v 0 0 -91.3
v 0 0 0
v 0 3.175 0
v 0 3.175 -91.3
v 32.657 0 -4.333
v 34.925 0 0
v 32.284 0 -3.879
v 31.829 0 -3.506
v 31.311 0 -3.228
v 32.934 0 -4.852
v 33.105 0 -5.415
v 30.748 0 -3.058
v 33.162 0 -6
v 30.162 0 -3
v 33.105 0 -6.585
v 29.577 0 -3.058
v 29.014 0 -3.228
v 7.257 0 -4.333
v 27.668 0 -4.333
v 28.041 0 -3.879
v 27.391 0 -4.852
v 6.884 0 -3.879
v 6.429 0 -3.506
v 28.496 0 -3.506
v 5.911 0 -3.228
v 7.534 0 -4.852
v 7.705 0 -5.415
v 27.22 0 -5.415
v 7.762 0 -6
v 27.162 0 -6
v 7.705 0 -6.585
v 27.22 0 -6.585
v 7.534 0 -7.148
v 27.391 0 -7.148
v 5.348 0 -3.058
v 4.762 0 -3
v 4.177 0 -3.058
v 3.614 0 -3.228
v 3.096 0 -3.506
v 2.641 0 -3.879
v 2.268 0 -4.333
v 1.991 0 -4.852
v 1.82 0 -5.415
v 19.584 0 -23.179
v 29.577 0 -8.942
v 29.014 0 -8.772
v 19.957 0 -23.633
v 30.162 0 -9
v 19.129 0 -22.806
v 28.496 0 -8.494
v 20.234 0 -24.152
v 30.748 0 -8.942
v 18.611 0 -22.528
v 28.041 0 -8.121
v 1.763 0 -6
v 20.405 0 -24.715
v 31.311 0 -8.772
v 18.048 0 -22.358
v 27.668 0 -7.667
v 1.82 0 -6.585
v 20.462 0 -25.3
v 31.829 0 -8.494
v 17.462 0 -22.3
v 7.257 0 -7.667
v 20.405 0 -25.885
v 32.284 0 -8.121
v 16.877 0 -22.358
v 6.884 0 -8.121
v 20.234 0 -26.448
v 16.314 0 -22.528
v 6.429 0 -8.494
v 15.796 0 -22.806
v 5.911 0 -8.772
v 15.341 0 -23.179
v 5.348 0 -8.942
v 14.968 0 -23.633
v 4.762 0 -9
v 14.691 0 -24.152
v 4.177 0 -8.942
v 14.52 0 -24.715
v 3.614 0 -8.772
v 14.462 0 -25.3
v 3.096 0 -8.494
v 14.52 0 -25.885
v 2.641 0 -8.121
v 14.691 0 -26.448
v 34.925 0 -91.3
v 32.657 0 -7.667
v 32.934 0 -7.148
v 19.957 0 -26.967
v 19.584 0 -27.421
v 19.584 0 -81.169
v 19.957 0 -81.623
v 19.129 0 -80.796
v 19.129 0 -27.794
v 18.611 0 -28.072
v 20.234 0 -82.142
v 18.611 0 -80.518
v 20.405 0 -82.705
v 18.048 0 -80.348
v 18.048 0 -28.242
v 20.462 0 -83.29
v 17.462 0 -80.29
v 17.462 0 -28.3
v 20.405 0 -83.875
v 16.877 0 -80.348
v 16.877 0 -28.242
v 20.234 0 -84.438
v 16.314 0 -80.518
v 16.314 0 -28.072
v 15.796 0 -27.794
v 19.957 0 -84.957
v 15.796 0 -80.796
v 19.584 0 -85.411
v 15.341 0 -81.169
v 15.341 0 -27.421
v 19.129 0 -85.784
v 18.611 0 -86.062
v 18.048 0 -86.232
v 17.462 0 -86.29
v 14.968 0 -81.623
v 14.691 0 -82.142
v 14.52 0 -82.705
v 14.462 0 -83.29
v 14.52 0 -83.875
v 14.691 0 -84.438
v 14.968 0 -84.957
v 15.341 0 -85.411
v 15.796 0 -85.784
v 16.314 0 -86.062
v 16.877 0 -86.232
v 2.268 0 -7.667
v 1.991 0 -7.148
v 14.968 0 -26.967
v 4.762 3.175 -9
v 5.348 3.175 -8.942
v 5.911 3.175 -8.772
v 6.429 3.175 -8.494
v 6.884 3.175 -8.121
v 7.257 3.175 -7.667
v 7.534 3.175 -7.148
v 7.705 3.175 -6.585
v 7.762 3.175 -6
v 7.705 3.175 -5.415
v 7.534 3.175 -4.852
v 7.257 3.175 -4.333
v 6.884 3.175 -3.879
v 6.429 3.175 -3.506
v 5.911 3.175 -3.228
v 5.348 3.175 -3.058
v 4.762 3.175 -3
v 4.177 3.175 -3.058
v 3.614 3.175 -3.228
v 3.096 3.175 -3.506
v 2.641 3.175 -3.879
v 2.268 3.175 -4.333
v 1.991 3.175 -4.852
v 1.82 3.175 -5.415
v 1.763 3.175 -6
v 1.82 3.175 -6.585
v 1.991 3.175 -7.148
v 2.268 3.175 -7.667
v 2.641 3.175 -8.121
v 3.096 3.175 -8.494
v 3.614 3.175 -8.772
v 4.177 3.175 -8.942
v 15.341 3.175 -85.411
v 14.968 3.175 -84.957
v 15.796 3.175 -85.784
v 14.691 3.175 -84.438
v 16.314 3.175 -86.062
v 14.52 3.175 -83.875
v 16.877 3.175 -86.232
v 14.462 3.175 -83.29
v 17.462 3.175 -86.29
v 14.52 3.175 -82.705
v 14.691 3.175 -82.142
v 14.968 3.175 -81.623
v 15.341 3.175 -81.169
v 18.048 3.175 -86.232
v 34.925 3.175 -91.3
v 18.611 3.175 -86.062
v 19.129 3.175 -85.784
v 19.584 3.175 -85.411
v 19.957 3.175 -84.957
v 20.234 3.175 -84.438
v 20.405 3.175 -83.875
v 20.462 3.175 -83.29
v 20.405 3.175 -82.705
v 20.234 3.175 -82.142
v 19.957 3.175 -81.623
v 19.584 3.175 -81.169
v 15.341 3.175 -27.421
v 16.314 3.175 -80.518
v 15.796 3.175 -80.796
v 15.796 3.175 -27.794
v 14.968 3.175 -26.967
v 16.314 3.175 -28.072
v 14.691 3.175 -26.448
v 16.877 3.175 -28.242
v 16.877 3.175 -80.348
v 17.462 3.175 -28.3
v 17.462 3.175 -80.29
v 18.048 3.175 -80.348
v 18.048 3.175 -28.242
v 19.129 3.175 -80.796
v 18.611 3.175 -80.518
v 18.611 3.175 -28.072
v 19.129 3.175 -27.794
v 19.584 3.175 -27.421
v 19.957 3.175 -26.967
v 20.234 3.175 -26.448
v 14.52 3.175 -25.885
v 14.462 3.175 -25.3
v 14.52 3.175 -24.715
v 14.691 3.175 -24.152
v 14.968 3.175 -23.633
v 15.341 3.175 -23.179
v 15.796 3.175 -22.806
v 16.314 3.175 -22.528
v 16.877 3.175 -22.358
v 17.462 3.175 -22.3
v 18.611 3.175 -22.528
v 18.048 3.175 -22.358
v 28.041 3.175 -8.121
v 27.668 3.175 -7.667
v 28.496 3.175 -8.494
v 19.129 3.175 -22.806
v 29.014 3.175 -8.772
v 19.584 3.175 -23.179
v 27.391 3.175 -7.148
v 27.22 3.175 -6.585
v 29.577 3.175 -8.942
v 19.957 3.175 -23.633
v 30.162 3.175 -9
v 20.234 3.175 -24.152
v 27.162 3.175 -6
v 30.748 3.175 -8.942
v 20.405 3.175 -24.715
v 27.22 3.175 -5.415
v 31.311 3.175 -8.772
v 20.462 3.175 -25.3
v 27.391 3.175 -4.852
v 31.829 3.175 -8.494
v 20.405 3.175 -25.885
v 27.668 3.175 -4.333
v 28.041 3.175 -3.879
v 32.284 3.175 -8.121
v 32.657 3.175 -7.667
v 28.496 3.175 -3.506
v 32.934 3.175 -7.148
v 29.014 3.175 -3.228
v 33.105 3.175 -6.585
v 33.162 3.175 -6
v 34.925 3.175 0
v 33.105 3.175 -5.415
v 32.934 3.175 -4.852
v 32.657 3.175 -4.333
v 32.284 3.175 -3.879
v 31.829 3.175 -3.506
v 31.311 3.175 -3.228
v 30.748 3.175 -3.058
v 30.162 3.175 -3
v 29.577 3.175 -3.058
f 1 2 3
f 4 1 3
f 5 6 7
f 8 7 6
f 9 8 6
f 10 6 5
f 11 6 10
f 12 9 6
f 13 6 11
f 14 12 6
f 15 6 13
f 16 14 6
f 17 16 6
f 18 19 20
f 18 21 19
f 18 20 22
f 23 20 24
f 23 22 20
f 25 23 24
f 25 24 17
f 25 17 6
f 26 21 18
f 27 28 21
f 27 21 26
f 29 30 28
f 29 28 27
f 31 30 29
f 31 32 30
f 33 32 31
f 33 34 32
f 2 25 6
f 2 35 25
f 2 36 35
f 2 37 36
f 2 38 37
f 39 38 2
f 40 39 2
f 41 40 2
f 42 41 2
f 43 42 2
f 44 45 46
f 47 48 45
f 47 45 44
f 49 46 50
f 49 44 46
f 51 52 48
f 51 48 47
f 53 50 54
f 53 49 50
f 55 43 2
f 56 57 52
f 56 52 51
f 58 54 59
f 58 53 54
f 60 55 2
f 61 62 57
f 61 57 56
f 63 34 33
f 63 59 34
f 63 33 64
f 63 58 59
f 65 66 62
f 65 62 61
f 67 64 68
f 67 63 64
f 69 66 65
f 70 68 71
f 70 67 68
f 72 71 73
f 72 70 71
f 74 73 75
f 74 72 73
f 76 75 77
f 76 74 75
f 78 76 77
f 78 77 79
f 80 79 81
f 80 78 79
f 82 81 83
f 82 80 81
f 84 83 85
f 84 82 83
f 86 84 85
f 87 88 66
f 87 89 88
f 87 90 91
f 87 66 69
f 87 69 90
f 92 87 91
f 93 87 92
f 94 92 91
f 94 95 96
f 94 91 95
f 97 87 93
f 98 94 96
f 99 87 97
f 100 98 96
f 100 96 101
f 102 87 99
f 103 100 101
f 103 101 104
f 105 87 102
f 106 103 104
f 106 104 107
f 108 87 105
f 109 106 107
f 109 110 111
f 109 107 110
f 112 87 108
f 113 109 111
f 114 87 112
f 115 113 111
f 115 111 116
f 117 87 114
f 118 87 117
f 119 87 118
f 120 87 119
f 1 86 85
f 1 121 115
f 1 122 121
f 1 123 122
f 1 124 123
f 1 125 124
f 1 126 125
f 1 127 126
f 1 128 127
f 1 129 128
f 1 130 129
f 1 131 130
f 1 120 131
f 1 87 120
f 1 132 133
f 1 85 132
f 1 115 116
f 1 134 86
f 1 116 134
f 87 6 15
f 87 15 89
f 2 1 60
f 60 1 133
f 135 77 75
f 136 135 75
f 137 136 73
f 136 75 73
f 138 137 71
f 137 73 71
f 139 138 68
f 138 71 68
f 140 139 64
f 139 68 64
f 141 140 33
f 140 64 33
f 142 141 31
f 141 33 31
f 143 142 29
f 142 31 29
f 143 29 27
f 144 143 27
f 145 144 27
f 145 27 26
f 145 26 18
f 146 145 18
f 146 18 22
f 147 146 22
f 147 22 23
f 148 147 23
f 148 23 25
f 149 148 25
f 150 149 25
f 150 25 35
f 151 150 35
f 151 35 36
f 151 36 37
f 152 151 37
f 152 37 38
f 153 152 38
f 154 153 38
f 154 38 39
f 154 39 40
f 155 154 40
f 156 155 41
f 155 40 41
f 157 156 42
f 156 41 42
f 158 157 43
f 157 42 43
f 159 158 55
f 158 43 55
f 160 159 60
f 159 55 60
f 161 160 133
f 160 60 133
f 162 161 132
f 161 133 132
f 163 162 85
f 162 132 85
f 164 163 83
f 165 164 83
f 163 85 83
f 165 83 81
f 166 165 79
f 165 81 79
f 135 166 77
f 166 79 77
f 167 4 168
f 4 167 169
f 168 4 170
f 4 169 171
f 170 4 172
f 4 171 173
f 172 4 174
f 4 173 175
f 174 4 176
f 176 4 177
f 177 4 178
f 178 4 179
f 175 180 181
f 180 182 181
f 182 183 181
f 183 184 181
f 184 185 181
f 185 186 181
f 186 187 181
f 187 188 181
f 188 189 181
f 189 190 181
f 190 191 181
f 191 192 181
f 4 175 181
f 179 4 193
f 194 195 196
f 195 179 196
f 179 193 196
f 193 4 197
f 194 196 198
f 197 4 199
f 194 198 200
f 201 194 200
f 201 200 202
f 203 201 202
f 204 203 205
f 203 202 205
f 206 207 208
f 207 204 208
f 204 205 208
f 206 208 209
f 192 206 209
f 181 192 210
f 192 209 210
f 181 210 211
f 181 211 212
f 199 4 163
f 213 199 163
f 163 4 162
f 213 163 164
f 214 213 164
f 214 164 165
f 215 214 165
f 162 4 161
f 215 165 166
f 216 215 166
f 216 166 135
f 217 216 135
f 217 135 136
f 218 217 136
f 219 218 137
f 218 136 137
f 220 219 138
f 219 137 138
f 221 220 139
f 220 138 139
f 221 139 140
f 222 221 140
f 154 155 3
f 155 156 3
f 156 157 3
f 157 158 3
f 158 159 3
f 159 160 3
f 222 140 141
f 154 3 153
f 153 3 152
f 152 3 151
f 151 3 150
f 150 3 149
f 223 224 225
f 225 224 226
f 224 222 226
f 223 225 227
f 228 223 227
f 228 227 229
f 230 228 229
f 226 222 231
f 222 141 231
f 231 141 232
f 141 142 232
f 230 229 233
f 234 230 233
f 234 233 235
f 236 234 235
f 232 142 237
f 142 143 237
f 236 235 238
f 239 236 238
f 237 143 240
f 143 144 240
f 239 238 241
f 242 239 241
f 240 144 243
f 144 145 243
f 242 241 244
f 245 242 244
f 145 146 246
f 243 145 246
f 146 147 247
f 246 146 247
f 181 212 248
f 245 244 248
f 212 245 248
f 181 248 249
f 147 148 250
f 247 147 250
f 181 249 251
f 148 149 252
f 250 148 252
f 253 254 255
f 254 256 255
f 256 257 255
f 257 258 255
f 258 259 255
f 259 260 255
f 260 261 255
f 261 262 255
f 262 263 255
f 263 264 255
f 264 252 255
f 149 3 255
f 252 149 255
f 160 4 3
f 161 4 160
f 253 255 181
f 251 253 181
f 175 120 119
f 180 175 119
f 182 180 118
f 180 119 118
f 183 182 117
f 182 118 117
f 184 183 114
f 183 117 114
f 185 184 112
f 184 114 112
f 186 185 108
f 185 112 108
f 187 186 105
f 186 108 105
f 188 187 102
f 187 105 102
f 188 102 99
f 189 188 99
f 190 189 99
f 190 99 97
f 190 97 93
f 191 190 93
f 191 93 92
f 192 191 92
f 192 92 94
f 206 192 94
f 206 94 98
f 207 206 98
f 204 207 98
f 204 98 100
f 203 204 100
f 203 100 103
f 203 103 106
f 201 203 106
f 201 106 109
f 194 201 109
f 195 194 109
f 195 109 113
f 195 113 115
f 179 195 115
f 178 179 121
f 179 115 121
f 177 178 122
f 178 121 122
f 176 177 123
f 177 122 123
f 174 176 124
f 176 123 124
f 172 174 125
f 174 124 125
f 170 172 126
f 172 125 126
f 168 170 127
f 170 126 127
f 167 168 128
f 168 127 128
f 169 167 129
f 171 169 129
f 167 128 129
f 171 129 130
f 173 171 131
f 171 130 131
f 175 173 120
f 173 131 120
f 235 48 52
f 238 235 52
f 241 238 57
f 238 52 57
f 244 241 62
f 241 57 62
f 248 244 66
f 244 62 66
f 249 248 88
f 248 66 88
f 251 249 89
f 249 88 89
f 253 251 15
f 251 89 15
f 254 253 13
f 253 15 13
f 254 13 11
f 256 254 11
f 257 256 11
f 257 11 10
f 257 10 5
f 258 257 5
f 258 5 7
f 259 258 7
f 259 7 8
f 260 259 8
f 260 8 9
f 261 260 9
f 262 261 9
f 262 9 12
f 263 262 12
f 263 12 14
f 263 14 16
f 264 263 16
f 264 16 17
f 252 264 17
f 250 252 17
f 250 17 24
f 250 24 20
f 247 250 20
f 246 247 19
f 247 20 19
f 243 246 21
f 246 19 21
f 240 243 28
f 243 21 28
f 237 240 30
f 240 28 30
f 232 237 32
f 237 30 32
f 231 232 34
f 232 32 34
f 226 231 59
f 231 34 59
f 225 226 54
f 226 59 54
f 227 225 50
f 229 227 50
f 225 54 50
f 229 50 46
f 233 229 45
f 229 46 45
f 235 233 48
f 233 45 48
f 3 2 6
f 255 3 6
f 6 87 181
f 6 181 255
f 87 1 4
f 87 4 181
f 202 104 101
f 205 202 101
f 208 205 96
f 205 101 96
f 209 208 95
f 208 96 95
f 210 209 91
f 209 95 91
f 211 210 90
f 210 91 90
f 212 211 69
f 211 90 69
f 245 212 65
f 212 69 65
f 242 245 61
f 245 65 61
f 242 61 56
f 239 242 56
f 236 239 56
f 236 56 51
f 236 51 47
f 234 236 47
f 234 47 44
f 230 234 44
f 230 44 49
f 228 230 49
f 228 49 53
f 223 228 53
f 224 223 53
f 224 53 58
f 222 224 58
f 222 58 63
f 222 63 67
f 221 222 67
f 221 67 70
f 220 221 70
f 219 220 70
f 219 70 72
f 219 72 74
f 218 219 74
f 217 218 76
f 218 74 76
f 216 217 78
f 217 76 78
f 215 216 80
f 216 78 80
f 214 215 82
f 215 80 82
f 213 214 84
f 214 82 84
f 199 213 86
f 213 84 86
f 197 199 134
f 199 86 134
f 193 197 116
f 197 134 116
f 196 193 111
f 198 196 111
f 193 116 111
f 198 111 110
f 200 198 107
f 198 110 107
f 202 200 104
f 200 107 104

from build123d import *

# Parameters (mm, degrees)
SKETCH1_W           = 38.1
SKETCH1_H           = 120
BOSS_EXTRUDE1_DEPTH = 38.1
SKETCH2_W           = 34.925
SKETCH2_H           = 34.925
CUT_EXTRUDE1_DEPTH  = 130.767142413
SKETCH18_W          = 3.175
SKETCH18_H          = 3.175
CUT_EXTRUDE3_DEPTH  = 130.767142413
SKETCH19_R          = 3
CUT_EXTRUDE4_DEPTH  = 121.228267267
SKETCH20_W          = 34.925
SKETCH20_H          = 5
CUT_EXTRUDE5_DEPTH  = 121.228267267
SKETCH21_W          = 34.925
SKETCH21_H          = 23.7
CUT_EXTRUDE6_DEPTH  = 121.228267267


with BuildPart() as part:
    # Sketch1 → Boss-Extrude1 (new body)
    with BuildSketch(Plane.XZ.offset(34.925)):
        with Locations((15.875, -55)):
            Rectangle(SKETCH1_W, SKETCH1_H)
    extrude(amount=-BOSS_EXTRUDE1_DEPTH)

    # Sketch2 → Cut-Extrude1 (cut, through all)
    with BuildSketch(Plane(origin=(0, 0, -115), x_dir=(-1, 0, 0), z_dir=(0, 0, -1))):
        with Locations((-17.4625, -17.4625)):
            Rectangle(SKETCH2_W, SKETCH2_H)
    extrude(amount=-CUT_EXTRUDE1_DEPTH, mode=Mode.SUBTRACT)

    # Sketch18 → Cut-Extrude3 (cut, through all)
    with BuildSketch(Plane.XY.offset(5)):
        with Locations((-1.5875, 1.5875)):
            Rectangle(SKETCH18_W, SKETCH18_H)
    extrude(amount=-CUT_EXTRUDE3_DEPTH, mode=Mode.SUBTRACT)


with BuildPart() as body_2:
    # of the pieces the cut leaves, the one that is kept (cut_extrude3_keep)
    add(part.part.solids().sort_by_distance((34.925, 0, -115))[0])

    # Sketch19 → Cut-Extrude4 (cut, through all)
    with BuildSketch(Plane.XZ):
        with Locations(Location((4.7625, -6, 0), (0, 0, 270))):
            Circle(SKETCH19_R)
        with Locations(Location((30.1625, -6, 0), (0, 0, 270))):
            Circle(SKETCH19_R)
        with Locations(Location((17.4625, -83.29, 0), (0, 0, 270))):
            Circle(SKETCH19_R)
        with Locations(Location((17.4625, -25.3, 0), (0, 0, 270))):
            Circle(SKETCH19_R)
    extrude(amount=-CUT_EXTRUDE4_DEPTH, mode=Mode.SUBTRACT)

    # Sketch20 → Cut-Extrude5 (cut, through all)
    with BuildSketch(Plane.XZ):
        with Locations((17.4625, 2.5)):
            Rectangle(SKETCH20_W, SKETCH20_H)
    extrude(amount=-CUT_EXTRUDE5_DEPTH, mode=Mode.SUBTRACT)

    # Sketch21 → Cut-Extrude6 (cut, through all)
    with BuildSketch(Plane.XZ):
        with Locations((17.4625, -103.15)):
            Rectangle(SKETCH21_W, SKETCH21_H)
    extrude(amount=-CUT_EXTRUDE6_DEPTH, mode=Mode.SUBTRACT)


solid = body_2.part
